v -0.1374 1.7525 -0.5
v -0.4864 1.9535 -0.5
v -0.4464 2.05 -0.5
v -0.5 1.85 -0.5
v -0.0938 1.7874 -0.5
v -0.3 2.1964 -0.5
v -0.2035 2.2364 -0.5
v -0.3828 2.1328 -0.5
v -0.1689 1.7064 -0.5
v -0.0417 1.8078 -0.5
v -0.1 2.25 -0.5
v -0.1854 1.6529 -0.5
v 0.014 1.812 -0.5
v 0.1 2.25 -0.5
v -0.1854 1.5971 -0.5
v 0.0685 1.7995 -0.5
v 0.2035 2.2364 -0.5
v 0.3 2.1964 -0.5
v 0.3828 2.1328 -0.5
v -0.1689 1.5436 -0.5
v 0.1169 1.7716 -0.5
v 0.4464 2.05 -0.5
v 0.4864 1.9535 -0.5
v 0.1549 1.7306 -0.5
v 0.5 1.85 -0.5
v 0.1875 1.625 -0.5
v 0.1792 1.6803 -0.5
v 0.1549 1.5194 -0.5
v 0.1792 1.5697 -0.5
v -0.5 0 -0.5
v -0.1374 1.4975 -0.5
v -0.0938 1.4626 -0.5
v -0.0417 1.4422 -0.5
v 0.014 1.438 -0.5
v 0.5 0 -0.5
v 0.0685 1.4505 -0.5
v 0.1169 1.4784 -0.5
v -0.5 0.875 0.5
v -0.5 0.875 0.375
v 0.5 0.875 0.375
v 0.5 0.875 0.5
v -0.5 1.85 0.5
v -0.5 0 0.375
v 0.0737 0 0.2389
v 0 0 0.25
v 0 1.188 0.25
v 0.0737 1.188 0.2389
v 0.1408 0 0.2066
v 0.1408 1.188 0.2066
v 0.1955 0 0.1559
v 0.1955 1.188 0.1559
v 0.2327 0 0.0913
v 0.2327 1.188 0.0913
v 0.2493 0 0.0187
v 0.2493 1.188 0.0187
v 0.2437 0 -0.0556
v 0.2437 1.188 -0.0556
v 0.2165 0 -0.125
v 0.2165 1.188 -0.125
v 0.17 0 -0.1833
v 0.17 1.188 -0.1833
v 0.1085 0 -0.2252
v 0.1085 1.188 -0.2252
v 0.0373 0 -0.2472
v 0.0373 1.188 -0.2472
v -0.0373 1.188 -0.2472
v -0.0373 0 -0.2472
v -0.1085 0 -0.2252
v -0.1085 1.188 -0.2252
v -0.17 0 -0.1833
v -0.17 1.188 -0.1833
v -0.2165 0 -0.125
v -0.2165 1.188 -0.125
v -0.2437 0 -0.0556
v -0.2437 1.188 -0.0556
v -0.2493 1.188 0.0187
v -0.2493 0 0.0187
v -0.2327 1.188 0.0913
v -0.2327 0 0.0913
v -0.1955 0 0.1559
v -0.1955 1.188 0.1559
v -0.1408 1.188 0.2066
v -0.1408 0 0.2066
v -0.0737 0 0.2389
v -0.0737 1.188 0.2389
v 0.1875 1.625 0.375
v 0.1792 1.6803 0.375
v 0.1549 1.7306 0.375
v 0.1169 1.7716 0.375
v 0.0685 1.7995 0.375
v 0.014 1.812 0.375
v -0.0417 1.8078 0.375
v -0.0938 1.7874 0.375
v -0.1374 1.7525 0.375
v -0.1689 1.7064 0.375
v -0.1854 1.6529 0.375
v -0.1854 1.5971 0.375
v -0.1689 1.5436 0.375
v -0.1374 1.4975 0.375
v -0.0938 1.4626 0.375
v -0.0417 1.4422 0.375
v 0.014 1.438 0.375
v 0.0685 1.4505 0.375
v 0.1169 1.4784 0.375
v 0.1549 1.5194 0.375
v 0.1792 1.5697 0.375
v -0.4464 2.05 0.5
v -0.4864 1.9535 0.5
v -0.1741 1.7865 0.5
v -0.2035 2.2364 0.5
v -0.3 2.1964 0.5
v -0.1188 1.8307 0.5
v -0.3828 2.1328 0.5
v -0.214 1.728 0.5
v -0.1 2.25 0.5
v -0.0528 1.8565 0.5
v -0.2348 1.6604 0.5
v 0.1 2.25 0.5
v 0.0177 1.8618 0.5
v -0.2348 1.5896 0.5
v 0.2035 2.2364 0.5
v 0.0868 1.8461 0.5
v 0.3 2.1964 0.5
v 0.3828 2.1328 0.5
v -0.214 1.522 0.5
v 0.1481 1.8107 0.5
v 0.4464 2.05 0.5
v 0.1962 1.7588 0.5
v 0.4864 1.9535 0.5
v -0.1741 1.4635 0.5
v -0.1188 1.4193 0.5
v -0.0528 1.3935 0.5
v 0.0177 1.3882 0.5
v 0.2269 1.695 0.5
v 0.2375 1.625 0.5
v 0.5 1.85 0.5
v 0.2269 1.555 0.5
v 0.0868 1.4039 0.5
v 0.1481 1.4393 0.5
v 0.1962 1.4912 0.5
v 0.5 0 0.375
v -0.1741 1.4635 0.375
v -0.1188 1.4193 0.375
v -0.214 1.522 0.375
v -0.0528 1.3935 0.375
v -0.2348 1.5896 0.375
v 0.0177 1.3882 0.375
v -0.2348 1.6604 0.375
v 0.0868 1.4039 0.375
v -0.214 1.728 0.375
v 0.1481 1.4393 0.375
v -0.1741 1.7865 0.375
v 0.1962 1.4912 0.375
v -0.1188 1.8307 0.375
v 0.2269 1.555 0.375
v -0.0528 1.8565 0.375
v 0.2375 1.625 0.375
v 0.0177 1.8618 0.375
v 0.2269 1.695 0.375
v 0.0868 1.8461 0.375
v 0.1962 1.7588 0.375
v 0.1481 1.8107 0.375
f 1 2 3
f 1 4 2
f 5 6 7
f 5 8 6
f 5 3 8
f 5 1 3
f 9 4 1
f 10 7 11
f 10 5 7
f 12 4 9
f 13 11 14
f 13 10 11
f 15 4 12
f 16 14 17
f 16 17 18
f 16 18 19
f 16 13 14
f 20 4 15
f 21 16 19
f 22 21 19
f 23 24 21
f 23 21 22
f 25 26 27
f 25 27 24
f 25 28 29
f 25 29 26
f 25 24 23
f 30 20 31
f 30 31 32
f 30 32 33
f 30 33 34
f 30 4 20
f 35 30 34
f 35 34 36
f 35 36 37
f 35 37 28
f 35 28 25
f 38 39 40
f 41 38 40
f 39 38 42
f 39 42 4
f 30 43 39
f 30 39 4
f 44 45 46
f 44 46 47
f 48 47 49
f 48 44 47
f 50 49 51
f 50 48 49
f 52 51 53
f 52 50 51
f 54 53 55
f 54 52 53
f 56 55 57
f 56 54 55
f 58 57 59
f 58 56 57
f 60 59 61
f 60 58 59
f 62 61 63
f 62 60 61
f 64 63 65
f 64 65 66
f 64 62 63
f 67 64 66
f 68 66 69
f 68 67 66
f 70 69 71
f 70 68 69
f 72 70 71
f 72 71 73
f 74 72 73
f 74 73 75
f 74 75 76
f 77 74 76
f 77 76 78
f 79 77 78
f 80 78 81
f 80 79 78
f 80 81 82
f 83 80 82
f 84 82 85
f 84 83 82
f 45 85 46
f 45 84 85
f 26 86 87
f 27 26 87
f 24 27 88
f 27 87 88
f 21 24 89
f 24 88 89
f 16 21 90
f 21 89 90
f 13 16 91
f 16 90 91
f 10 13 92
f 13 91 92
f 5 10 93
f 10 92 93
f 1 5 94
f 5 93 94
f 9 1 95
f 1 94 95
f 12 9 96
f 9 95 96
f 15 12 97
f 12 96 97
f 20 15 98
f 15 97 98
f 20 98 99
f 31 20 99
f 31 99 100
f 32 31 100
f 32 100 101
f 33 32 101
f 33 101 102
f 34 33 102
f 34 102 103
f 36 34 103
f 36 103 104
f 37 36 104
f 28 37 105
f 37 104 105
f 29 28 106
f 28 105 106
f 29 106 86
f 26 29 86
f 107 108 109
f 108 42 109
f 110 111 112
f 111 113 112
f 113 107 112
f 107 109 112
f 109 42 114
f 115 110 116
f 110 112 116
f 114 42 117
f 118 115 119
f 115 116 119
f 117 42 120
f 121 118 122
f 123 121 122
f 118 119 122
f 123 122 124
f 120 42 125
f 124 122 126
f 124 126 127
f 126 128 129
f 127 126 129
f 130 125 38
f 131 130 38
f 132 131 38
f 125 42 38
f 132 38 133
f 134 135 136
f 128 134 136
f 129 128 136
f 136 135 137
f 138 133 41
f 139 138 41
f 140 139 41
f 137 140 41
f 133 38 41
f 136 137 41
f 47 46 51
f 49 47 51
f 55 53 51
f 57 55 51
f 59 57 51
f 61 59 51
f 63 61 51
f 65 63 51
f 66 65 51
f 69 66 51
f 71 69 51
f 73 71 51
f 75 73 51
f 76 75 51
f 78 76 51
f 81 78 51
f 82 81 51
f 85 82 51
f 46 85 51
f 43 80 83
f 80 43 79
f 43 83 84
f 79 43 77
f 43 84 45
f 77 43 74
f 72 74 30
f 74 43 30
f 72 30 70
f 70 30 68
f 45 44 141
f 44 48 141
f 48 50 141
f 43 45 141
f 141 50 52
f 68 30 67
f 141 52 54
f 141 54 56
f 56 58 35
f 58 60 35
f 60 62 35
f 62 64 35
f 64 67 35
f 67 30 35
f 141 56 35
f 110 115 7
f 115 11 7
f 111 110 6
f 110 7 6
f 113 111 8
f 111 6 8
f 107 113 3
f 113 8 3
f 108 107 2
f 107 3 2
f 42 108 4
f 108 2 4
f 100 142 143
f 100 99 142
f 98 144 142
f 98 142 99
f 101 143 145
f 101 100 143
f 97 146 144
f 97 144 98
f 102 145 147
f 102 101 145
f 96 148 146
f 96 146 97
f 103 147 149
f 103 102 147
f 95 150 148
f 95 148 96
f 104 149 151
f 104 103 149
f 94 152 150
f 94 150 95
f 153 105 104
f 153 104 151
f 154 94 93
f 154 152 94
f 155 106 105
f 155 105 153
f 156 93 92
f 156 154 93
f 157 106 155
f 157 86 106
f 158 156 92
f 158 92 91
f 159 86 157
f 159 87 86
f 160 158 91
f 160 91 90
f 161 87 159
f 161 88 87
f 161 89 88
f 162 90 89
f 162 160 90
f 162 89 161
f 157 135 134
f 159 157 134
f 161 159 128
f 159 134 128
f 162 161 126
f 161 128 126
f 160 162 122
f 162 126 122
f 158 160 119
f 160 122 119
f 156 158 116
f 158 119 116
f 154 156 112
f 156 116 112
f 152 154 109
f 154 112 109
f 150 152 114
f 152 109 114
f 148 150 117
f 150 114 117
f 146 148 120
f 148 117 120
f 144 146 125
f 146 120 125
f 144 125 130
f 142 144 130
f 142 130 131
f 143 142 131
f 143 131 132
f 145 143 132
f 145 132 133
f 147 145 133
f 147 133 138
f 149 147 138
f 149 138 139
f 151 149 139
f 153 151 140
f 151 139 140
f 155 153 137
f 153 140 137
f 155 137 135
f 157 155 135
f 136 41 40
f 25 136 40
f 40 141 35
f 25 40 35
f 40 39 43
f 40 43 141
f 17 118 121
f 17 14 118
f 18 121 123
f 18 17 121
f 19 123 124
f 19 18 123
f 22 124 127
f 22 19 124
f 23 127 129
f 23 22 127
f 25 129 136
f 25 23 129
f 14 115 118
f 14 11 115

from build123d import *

# Parameters (mm, degrees)
SKETCH1_W           = 1
SKETCH1_H           = 1
BOSS_EXTRUDE1_DEPTH = 2.25
SKETCH3_W           = 1
SKETCH3_H           = 0.125
CUT_EXTRUDE4_DEPTH  = 0.875
SKETCH5_R           = 0.2375
CUT_EXTRUDE5_DEPTH  = 0.125
SKETCH6_R           = 0.1875
CUT_EXTRUDE6_DEPTH  = 0.875
SKETCH7_R           = 0.25
CUT_EXTRUDE7_DEPTH  = 1.188
FILLET1_R           = 0.4
FILLET2_R           = 0.4


with BuildPart() as part:
    # Sketch1 → Boss-Extrude1 (new body)
    with BuildSketch(Plane(origin=(0, 0, 0), x_dir=(1, 0, 0), z_dir=(0, 1, 0))):
        Rectangle(SKETCH1_W, SKETCH1_H)
    extrude(amount=BOSS_EXTRUDE1_DEPTH)

    # Sketch3 → Cut-Extrude4 (cut)
    with BuildSketch(Plane(origin=(0, 0.875, 0), x_dir=(1, 0, 0), z_dir=(0, 1, 0))):
        with Locations((0, -0.4375)):
            Rectangle(SKETCH3_W, SKETCH3_H)
    extrude(amount=-CUT_EXTRUDE4_DEPTH, mode=Mode.SUBTRACT)

    # Sketch5 → Cut-Extrude5 (cut)
    with BuildSketch(Plane.XY.offset(0.5)):
        with Locations((0, 1.625)):
            Circle(SKETCH5_R)
    extrude(amount=-CUT_EXTRUDE5_DEPTH, mode=Mode.SUBTRACT)

    # Sketch6 → Cut-Extrude6 (cut)
    with BuildSketch(Plane.XY.offset(0.375)):
        with Locations((0, 1.625)):
            Circle(SKETCH6_R)
    extrude(amount=-CUT_EXTRUDE6_DEPTH, mode=Mode.SUBTRACT)

    # Sketch7 → Cut-Extrude7 (cut)
    with BuildSketch(Plane(origin=(0, 0, 0), x_dir=(1, 0, 0), z_dir=(0, 1, 0))):
        with Locations(Location((0, 0, 0), (0, 0, 270))):
            Circle(SKETCH7_R)
    extrude(amount=CUT_EXTRUDE7_DEPTH, mode=Mode.SUBTRACT)

    # Fillet1
    fillet1_edges = [part.edges().sort_by_distance(p)[0] for p in [
        (0.5, 2.25, 0),
    ]]
    fillet(fillet1_edges, radius=FILLET1_R)

    # Fillet2
    fillet2_edges = [part.edges().sort_by_distance(p)[0] for p in [
        (-0.5, 2.25, 0),
    ]]
    fillet(fillet2_edges, radius=FILLET2_R)


solid = part.part
